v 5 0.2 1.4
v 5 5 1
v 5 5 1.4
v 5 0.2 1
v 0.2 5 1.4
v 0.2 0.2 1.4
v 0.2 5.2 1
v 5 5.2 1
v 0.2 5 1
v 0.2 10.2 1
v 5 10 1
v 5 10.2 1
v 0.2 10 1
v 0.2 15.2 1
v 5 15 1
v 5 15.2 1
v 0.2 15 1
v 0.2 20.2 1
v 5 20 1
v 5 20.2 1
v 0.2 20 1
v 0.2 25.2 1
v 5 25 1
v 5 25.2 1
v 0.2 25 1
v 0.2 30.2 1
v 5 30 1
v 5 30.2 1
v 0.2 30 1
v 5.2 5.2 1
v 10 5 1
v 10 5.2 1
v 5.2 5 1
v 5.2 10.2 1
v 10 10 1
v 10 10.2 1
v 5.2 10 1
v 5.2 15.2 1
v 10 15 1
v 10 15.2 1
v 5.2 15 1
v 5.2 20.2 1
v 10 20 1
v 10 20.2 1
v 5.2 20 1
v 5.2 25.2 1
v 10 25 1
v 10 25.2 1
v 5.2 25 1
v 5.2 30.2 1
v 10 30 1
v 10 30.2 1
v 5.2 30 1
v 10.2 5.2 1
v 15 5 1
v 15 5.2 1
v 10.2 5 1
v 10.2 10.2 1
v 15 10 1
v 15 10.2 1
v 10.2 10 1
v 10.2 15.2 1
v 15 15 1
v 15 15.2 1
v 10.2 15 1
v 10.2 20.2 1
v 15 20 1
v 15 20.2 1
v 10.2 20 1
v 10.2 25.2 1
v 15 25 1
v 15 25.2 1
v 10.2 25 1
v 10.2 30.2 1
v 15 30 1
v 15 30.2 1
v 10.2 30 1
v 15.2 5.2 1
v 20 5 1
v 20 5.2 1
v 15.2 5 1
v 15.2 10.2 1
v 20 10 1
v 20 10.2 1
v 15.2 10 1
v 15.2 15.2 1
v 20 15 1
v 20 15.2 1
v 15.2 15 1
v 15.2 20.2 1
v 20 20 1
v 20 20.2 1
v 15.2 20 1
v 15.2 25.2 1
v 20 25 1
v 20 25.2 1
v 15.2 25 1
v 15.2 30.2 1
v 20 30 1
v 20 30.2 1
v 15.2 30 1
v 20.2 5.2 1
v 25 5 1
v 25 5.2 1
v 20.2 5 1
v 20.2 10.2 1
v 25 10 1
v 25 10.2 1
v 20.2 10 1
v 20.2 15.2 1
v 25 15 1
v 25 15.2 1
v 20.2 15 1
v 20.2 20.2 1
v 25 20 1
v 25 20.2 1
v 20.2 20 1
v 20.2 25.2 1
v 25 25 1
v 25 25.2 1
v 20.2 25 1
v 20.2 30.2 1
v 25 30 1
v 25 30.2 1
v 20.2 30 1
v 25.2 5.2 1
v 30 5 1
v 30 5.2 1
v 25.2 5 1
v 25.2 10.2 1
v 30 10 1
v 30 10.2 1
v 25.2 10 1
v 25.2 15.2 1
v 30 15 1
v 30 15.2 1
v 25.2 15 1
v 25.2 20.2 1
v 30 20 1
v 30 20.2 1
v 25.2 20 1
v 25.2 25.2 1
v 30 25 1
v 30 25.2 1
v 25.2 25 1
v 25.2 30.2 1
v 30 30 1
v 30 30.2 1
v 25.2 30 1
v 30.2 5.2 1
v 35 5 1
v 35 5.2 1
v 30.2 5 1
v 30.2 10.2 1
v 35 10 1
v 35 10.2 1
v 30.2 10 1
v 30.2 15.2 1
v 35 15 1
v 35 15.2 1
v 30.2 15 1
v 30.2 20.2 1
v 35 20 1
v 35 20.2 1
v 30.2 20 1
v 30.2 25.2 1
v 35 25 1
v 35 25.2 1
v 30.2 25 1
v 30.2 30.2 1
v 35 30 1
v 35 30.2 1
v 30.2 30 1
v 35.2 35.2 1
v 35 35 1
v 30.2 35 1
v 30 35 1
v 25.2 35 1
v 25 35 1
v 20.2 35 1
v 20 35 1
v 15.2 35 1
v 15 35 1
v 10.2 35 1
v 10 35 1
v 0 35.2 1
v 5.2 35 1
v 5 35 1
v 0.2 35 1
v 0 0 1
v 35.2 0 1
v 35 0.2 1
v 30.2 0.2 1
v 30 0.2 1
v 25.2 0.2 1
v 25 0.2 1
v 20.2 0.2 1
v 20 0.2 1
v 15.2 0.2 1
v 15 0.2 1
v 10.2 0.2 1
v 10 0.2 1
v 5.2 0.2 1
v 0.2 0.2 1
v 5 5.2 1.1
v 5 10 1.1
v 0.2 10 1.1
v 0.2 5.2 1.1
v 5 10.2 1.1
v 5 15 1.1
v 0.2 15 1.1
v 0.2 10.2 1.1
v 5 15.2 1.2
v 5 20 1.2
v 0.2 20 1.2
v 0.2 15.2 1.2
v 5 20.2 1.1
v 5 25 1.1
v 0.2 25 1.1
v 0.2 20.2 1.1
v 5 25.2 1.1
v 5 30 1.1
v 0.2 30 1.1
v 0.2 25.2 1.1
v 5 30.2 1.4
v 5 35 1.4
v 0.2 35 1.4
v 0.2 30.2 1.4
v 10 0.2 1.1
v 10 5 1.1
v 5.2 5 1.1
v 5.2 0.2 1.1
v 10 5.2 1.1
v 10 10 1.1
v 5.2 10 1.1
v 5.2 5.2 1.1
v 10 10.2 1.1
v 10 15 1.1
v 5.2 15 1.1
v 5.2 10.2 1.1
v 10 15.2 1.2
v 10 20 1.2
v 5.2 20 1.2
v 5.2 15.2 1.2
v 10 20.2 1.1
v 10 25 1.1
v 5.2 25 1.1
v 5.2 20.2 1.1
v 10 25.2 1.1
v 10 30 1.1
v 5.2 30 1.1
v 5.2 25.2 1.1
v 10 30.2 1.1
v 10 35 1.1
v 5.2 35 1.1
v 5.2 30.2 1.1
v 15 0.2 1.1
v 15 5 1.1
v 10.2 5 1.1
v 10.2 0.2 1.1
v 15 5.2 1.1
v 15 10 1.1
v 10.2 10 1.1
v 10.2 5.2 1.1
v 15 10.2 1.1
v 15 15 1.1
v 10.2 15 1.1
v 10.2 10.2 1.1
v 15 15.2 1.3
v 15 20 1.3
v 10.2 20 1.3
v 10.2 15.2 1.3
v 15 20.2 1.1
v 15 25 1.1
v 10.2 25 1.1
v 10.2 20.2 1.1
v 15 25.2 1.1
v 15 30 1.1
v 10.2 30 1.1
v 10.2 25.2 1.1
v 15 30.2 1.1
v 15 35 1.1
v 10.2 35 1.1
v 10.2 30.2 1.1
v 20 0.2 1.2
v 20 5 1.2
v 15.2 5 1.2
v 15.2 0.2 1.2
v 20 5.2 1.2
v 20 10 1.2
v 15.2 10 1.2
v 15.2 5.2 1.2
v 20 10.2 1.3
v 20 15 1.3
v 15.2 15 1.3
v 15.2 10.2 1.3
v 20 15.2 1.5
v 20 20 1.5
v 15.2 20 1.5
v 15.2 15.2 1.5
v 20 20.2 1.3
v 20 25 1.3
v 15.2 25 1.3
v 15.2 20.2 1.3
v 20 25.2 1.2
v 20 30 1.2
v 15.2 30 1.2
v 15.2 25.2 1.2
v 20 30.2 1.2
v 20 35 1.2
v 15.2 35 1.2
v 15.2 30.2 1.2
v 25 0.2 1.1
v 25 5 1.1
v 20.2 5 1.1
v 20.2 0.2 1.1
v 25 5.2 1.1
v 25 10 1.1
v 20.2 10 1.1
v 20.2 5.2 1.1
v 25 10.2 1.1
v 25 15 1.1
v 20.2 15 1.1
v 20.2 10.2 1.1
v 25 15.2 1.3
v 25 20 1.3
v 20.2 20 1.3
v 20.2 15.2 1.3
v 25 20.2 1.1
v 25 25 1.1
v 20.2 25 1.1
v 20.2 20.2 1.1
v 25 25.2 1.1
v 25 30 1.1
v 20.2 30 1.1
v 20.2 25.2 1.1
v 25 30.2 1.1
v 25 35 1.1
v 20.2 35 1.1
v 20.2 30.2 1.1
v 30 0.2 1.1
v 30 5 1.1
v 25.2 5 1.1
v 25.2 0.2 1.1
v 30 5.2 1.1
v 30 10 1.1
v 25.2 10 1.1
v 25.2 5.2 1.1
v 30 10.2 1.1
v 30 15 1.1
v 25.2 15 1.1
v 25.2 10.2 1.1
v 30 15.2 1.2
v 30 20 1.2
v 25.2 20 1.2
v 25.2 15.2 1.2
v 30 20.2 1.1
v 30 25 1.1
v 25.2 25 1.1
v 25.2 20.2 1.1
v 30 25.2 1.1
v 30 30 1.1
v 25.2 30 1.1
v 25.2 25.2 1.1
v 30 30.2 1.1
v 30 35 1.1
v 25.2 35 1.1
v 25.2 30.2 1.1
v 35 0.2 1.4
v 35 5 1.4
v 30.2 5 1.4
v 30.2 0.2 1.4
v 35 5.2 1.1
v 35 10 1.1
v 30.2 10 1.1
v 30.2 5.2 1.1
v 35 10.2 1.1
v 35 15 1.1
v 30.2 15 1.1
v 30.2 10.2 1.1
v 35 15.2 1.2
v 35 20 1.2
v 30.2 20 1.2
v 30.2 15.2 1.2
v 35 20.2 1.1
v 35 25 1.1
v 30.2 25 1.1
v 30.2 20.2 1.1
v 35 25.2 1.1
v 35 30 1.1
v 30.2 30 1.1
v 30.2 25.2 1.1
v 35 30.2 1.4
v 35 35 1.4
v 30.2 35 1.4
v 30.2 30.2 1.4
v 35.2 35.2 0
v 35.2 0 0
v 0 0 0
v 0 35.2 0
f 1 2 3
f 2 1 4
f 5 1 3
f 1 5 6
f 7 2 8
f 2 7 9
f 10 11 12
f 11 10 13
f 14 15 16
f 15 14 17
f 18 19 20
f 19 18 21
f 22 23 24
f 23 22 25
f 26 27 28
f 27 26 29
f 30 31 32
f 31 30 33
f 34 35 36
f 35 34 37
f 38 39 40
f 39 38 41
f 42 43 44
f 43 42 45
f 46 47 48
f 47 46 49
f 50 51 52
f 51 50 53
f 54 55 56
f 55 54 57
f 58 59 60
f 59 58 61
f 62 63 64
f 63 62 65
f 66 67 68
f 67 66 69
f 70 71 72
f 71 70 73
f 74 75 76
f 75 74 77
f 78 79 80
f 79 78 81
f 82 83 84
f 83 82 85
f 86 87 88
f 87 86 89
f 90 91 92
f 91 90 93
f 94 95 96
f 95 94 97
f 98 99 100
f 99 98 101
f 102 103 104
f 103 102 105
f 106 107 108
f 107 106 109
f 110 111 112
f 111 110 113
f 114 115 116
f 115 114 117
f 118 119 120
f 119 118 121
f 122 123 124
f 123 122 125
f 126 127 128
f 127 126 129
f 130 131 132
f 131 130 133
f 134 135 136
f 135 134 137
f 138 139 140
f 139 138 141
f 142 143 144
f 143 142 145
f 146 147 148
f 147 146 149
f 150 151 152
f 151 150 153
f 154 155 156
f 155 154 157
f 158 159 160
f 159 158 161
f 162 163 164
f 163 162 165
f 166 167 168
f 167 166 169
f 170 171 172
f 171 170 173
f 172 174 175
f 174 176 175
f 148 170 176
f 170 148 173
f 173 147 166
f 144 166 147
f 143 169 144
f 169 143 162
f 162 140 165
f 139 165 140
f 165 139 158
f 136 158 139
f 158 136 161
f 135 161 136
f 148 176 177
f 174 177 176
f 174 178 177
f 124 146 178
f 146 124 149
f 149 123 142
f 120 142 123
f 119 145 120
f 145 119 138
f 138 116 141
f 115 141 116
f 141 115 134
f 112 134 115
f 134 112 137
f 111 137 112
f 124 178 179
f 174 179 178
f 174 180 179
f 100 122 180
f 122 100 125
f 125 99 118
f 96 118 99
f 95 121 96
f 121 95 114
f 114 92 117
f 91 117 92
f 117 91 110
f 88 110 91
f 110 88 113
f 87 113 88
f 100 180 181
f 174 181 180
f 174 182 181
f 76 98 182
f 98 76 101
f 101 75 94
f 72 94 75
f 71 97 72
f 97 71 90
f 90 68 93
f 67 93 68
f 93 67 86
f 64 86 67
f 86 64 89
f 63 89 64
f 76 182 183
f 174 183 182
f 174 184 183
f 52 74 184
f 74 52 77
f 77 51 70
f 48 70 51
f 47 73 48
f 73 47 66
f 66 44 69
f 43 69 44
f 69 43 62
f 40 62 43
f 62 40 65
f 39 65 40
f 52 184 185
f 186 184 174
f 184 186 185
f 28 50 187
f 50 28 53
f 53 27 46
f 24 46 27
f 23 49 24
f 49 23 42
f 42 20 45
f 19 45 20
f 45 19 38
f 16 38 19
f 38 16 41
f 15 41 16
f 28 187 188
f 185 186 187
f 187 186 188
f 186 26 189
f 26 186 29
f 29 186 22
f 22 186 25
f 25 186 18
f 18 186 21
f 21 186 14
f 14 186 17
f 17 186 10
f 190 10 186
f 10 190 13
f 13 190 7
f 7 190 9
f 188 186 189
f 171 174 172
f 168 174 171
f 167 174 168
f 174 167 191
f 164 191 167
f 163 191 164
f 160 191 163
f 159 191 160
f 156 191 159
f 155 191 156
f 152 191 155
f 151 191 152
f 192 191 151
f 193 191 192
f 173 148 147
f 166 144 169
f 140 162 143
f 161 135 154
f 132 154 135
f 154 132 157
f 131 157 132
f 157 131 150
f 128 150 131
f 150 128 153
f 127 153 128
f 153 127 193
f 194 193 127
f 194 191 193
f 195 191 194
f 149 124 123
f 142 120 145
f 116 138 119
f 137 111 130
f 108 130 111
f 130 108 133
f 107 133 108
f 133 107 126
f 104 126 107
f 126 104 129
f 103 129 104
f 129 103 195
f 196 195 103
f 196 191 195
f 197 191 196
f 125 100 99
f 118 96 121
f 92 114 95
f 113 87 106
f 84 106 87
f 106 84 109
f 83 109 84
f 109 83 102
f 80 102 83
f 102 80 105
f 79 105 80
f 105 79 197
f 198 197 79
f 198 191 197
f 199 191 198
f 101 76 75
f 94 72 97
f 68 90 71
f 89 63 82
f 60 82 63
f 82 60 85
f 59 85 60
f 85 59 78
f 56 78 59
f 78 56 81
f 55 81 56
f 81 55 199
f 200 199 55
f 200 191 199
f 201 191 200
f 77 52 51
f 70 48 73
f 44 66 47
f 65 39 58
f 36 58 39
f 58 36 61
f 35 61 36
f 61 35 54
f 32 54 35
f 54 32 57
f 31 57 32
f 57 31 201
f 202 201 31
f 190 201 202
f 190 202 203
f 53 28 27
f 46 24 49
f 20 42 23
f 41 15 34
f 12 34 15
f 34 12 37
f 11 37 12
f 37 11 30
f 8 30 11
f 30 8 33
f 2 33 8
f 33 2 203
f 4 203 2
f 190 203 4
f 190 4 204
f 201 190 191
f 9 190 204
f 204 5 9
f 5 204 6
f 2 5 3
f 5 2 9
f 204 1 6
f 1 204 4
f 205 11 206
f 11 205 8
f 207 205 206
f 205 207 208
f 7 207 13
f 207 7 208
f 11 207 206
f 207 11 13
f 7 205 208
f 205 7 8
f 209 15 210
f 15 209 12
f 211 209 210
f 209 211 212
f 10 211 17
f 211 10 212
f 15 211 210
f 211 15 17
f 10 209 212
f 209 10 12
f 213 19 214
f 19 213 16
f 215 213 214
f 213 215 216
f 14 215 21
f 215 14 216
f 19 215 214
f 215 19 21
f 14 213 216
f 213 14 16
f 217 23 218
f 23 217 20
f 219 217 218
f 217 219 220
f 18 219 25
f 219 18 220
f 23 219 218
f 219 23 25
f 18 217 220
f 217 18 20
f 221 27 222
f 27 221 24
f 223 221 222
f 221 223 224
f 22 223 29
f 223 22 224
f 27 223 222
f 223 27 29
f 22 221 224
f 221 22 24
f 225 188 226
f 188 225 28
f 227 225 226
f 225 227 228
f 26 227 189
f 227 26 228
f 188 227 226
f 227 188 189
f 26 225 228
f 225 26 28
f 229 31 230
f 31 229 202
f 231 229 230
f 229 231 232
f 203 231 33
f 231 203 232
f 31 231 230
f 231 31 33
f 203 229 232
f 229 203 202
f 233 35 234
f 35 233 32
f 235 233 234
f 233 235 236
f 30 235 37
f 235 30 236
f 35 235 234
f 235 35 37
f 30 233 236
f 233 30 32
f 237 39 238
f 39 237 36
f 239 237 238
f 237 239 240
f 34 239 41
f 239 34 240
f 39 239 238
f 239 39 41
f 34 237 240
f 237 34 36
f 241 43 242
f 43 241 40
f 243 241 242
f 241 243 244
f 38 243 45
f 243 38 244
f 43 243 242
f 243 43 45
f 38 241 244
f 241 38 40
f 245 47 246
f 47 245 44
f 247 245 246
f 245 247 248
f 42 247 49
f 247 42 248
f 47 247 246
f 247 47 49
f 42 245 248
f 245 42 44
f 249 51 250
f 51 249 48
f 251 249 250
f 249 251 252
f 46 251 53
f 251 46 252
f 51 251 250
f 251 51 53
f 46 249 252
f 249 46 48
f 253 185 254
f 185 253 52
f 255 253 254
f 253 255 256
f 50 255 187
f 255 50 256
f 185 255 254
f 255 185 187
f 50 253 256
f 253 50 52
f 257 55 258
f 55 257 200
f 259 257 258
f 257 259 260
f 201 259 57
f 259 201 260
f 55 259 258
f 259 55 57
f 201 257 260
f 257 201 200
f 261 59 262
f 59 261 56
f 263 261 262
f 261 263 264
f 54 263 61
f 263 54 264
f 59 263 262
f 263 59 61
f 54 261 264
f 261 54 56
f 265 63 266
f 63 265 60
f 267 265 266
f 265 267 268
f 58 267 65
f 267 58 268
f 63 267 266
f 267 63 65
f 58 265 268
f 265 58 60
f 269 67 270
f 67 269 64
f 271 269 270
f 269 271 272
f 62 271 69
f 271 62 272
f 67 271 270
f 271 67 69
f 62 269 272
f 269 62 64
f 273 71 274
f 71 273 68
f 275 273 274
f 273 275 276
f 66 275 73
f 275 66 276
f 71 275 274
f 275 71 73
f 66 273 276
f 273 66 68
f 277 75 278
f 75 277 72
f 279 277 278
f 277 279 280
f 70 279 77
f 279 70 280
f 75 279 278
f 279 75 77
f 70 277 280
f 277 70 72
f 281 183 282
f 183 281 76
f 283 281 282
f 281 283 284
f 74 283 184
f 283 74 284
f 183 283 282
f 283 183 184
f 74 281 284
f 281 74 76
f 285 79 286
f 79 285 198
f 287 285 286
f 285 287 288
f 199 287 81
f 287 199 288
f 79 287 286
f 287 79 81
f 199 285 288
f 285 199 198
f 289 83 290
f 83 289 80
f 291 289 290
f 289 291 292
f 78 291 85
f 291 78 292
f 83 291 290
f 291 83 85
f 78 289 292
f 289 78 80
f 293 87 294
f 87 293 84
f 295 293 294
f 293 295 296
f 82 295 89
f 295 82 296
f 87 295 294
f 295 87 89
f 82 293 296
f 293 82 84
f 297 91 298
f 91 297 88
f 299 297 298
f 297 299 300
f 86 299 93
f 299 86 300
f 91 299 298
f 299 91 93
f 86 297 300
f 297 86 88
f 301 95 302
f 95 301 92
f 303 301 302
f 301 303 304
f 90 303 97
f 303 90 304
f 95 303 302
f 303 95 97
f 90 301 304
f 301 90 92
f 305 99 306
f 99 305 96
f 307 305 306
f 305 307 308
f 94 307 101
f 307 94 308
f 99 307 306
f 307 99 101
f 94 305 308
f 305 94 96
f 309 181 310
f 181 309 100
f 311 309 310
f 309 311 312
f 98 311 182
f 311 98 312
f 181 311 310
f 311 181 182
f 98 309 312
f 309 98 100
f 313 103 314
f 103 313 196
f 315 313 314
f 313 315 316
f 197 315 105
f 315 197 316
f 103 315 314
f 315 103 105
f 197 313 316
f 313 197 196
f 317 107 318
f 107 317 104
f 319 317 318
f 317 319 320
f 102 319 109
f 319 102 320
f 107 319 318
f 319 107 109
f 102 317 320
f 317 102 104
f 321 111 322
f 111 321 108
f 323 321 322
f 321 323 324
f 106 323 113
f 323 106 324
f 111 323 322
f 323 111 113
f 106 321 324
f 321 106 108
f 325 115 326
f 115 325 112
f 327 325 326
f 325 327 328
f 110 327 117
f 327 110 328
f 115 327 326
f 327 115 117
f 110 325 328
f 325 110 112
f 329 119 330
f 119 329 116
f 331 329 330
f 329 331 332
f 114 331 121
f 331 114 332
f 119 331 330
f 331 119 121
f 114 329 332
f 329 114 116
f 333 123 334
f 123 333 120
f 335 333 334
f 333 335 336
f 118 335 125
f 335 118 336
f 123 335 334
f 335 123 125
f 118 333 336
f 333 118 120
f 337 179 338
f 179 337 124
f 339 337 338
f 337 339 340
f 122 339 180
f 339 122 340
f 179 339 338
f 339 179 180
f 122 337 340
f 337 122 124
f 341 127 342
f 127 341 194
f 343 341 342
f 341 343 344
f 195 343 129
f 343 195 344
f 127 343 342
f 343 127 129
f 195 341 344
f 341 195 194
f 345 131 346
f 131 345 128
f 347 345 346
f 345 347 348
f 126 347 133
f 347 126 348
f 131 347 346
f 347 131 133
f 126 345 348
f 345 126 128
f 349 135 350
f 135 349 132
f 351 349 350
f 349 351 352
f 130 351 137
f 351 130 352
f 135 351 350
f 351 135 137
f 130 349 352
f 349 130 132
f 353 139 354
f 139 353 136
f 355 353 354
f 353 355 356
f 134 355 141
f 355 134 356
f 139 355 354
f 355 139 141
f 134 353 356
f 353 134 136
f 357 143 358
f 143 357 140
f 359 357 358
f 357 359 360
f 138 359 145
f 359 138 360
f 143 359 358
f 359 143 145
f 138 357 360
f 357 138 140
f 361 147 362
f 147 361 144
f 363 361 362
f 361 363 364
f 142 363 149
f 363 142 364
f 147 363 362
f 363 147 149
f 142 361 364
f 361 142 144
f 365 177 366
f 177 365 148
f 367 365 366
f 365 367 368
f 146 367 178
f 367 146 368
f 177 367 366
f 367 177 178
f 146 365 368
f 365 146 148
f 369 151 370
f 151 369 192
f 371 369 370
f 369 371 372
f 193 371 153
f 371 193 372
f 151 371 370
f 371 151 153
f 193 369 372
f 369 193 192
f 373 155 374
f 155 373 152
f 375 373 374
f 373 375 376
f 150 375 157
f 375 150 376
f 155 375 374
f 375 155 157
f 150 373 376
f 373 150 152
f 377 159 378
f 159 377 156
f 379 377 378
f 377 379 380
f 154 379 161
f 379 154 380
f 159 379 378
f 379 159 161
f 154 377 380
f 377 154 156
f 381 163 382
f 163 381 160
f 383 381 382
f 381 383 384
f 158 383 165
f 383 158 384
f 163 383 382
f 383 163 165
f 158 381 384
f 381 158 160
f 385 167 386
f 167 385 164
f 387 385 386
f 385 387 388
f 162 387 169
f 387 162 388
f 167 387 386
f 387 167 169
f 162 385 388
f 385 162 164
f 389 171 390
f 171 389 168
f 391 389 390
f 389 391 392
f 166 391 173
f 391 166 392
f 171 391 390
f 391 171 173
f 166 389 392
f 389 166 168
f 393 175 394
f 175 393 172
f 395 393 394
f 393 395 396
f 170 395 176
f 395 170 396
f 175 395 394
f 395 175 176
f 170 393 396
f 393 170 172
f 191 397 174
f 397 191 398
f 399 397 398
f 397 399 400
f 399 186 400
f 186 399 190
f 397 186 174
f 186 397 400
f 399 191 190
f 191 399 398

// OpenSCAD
// ------------------------------------------------- ;
//
//         Single File Tafl Game Generator
//
// ------------------------------------------------- ;

// ------------------------------------------------- ;
//         User Configuration Section
// ------------------------------------------------- ;

// Specific set configuration to print. 1 - Brandubh, 2 - Ard Ri, 3 - Tablut, 4 - Tawlbwrdd, 5 - Hnefatafl, 6 - Alea Evangelii.
SetID = 1;

// What to generate. 1 - Board, 2 - Pieces, 3 - Single Pawn, 4 - Single King.
Generate = 1;

// Specific piece style to print. 1 - Horik, 2 - Forkbeard
PieceID = 1;

// Level of detail for smoothing. Low - 90, Medium - 180, High - 360.
Detail = 180;

// Scale output. Pieces have a 4mm base with varying overhangs and the boards are 4.8mm squares with 0.2mm spacing and margins.
Scale = 1;

// ------------------------------------------------- ;
//         End User Configuration
// ------------------------------------------------- ;

scale(Scale)

if (Generate == 1) {
   
   GenerateBoard(SetID);
   
} else if (Generate == 2) {
   
   GeneratePieces(SetID, PieceID, Detail);
   
} else if (Generate == 3) {
   
   TaflPawn(PieceID, Detail);
   
} else if (Generate == 4) {
   
   TaflKing(PieceID, Detail);
   
}

// Board definition
// 0 - Normal Square
// 1 - Black Square
// 2 - White Square
// 3 - Corner
// 4 - Throne

// Generate tafl board by SetID
module GenerateBoard(SetID) {

   if (SetID == 1) {
      
      // Brandubh
      BoardSize = 7;
      
      Board = [[3, 0, 0, 1, 0, 0, 3],
               [0, 0, 0, 1, 0, 0, 0],
               [0, 0, 0, 2, 0, 0, 0],
               [1, 1, 2, 4, 2, 1, 1],
               [0, 0, 0, 2, 0, 0, 0],
               [0, 0, 0, 1, 0, 0, 0],
               [3, 0, 0, 1, 0, 0, 3]];
      
      TaflBoard(BoardSize, Board);
      
   } else if ((SetID == 2)) {
      
      // Ard Ri
      BoardSize = 7;
      
      Board = [[3, 0, 1, 1, 1, 0, 3],
               [0, 0, 0, 1, 0, 0, 0],
               [1, 0, 2, 2, 2, 0, 1],
               [1, 1, 2, 4, 2, 1, 1],
               [1, 0, 2, 2, 2, 0, 1],
               [0, 0, 0, 1, 0, 0, 0],
               [3, 0, 1, 1, 1, 0, 3]];
      
      TaflBoard(BoardSize, Board);
      
   } else if ((SetID == 3)) {
      
      // Tablut
      BoardSize = 9;
      
      Board = [[3, 0, 0, 1, 1, 1, 0, 0, 3],
               [0, 0, 0, 0, 1, 0, 0, 0, 0],
               [0, 0, 0, 0, 2, 0, 0, 0, 0],
               [1, 0, 0, 0, 2, 0, 0, 0, 1],
               [1, 1, 2, 2, 4, 2, 2, 1, 1],
               [1, 0, 0, 0, 2, 0, 0, 0, 1],
               [0, 0, 0, 0, 2, 0, 0, 0, 0],
               [0, 0, 0, 0, 1, 0, 0, 0, 0],
               [3, 0, 0, 1, 1, 1, 0, 0, 3],];
      
      
      TaflBoard(BoardSize, Board);
      
   } else if (SetID == 4) { 
      
      //Tawlbwrdd
      BoardSize = 11;
      
      Board = [[3, 0, 0, 0, 1, 1, 1, 0, 0, 0, 3],
               [0, 0, 0, 0, 1, 0, 1, 0, 0, 0, 0],
               [0, 0, 0, 0, 0, 1, 0, 0, 0, 0, 0],
               [0, 0, 0, 0, 0, 2, 0, 0, 0, 0, 0],
               [1, 1, 0, 0, 2, 2, 2, 0, 0, 1, 1],
               [1, 0, 1, 2, 2, 4, 2, 2, 1, 0, 1],
               [1, 1, 0, 0, 2, 2, 2, 0, 0, 1, 1],
               [0, 0, 0, 0, 0, 2, 0, 0, 0, 0, 0],
               [0, 0, 0, 0, 0, 1, 0, 0, 0, 0, 0],
               [0, 0, 0, 0, 1, 0, 1, 0, 0, 0, 0],
               [3, 0, 0, 0, 1, 1, 1, 0, 0, 0, 3]];
      
      
      TaflBoard(BoardSize, Board);
      
   } else if ((SetID == 5)) {
      
      // Hnefatafl
      BoardSize = 11;
      
      Board = [[3, 0, 0, 1, 1, 1, 1, 1, 0, 0, 3],
               [0, 0, 0, 0, 0, 1, 0, 0, 0, 0, 0],
               [0, 0, 0, 0, 0, 0, 0, 0, 0, 0, 0],
               [1, 0, 0, 0, 0, 2, 0, 0, 0, 0, 1],
               [1, 0, 0, 0, 2, 2, 2, 0, 0, 0, 1],
               [1, 1, 0, 2, 2, 4, 2, 2, 0, 1, 1],
               [1, 0, 0, 0, 2, 2, 2, 0, 0, 0, 1],
               [1, 0, 0, 0, 0, 2, 0, 0, 0, 0, 1],
               [0, 0, 0, 0, 0, 0, 0, 0, 0, 0, 0],
               [0, 0, 0, 0, 0, 1, 0, 0, 0, 0, 0],
               [3, 0, 0, 1, 1, 1, 1, 1, 0, 0, 3]];
      
      
      TaflBoard(BoardSize, Board);
      
   } else if (SetID == 6) {
      
      // Alea Evangelii
      BoardSize =19;
      
      Board = [[3, 3, 1, 0, 0, 1, 0, 0, 0, 0, 0, 0, 0, 1, 0, 0, 1, 3, 3],
               [3, 3, 0, 0, 0, 0, 0, 0, 0, 0, 0, 0, 0, 0, 0, 0, 0, 3, 3],
               [1, 0, 0, 0, 0, 1, 0, 0, 0, 0, 0, 0, 0, 1, 0, 0, 0, 0, 1],
               [0, 0, 0, 0, 0, 0, 0, 1, 0, 1, 0, 1, 0, 0, 0, 0, 0, 0, 0],
               [0, 0, 0, 0, 0, 0, 1, 0, 2, 0, 2, 0, 1, 0, 0, 0, 0, 0, 0],
               [1, 0, 1, 0, 0, 1, 0, 0, 0, 0, 0, 0, 0, 1, 0, 0, 1, 0, 1],
               [0, 0, 0, 0, 1, 0, 0, 0, 0, 2, 0, 0, 0, 0, 1, 0, 0, 0, 0],
               [0, 0, 0, 1, 0, 0, 0, 0, 2, 0, 2, 0, 0, 0, 0, 1, 0, 0, 0],
               [0, 0, 0, 0, 2, 0, 0, 2, 0, 2, 0, 2, 0, 0, 2, 0, 0, 0, 0],
               [0, 0, 0, 1, 0, 0, 2, 0, 2, 4, 2, 0, 2, 0, 0, 1, 0, 0, 0],
               [0, 0, 0, 0, 2, 0, 0, 2, 0, 2, 0, 2, 0, 0, 2, 0, 0, 0, 0],
               [0, 0, 0, 1, 0, 0, 0, 0, 2, 0, 2, 0, 0, 0, 0, 1, 0, 0, 0],
               [0, 0, 0, 0, 1, 0, 0, 0, 0, 2, 0, 0, 0, 0, 1, 0, 0, 0, 0],
               [1, 0, 1, 0, 0, 1, 0, 0, 0, 0, 0, 0, 0, 1, 0, 0, 1, 0, 1],
               [0, 0, 0, 0, 0, 0, 1, 0, 2, 0, 2, 0, 1, 0, 0, 0, 0, 0, 0],
               [0, 0, 0, 0, 0, 0, 0, 1, 0, 1, 0, 1, 0, 0, 0, 0, 0, 0, 0],
               [1, 0, 0, 0, 0, 1, 0, 0, 0, 0, 0, 0, 0, 1, 0, 0, 0, 0, 1],
               [3, 3, 0, 0, 0, 0, 0, 0, 0, 0, 0, 0, 0, 0, 0, 0, 0, 3, 3],
               [3, 3, 1, 0, 0, 1, 0, 0, 0, 0, 0, 0, 0, 1, 0, 0, 1, 3, 3]];
      
      
      TaflBoard(BoardSize, Board);
      
   }
   
};

// Create tafl board.
module TaflBoard(BoardSize, Board) {
   
   union() {
      
      cube([(BoardSize * 5) + 0.2, (BoardSize * 5) + 0.2, 1]);
      
      for (x = [0:BoardSize - 1]) {
         
         for (y = [0:BoardSize - 1]) {
            
            translate([(x * 5) + 0.2, (y * 5) + 0.2, 1]) {
              
              cube([4.8 ,4.8 ,(Board[x][y] + 1) * 0.1]);
              
            }
            
         }
         
      }
   
   }
   
};

// Generate set of pieces by SetID.
module GeneratePieces(SetID, PieceID, Detail) {
   
   if (SetID == 1) {
      
      // Brandubh
      TaflPieces(
      KingCount = 1,
      WhiteCount = 4,
      BlackCount = 8,
      GridPadding = 0,
      PieceID = PieceID,
      Detail = Detail);
      
   } else if ((SetID == 2) || (SetID == 3)) {
      
      // Ard Ri/Tablut
      TaflPieces(
      KingCount = 1,
      WhiteCount = 8,
      BlackCount = 12,
      GridPadding = 0,
      PieceID = PieceID,
      Detail = Detail);
      
   } else if ((SetID == 4) || (SetID == 5)) {
      
      // Hnefatafl/Tawlbwrdd
      TaflPieces(
      KingCount = 1,
      WhiteCount = 12,
      BlackCount = 24,
      GridPadding = 1,
      PieceID = PieceID,
      Detail = Detail);
      
   } else if (SetID == 6) {
      
      // Alea Evangelii
      TaflPieces(
      KingCount = 1,
      WhiteCount = 24,
      BlackCount = 48,
      GridPadding = 0,
      PieceID = PieceID,
      Detail = Detail);
      
   }
   
};

// Generate selected piece layout for printing.
module TaflPieces(KingCount, WhiteCount, BlackCount, GridPadding, PieceID, Detail) {
   
   TotalCount = BlackCount + WhiteCount + KingCount;
   
   GridLayout = round(sqrt(TotalCount)) + GridPadding;
   
   for (x = [1:GridLayout]){
      
      for (y = [1:GridLayout]){
         
         CurrentPiece = (((x-1) * GridLayout) + y);
         
         if (CurrentPiece < KingCount + 1) {
            
            color("white")
            translate([(x * 5) - 2.5, (y * 5) - 2.5])
            TaflKing(PieceID, Detail);
            
         } else if ((CurrentPiece > KingCount)&&(CurrentPiece < WhiteCount + KingCount + 1)) {
            
            color("white")
            translate([(x * 5) - 2.5, (y * 5) - 2.5])
            TaflPawn(PieceID, Detail);
            
         } else if ((CurrentPiece < TotalCount + 1)&&(CurrentPiece > WhiteCount + KingCount)) {
            
            color("black")
            translate([(x * 5) - 2.5, (y * 5) - 2.5])
            TaflPawn(PieceID, Detail);
            
         }
         
      }
      
   }
   
};

// Generate pawn of pieces by PieceID.
module TaflPawn(PieceID, Detail) {
   
   if (PieceID == 1) {
      
      HorikTaflPawn(Detail);
      
   } else if (PieceID == 2) {
      
      ForkbeardTaflPawn(Detail);
      
   }
   
};

// Generate Horik style pawn piece.
module HorikTaflPawn(Detail) {
   
   // Join pieces into single manifold mesh.
   union() {
      
      // Rotate extrude base and stem from polygon.
      rotate_extrude($fn=Detail) {
         polygon( points=[ [0, 0], [2, 0], [2.1, 0.2], [1.75, 0.3], [1.5, 0.5], [1.25, 0.8], [1.5, 1], [1.5, 1.1], [1.4, 1.15], [1.2, 1.3], [1, 1.4], [1, 2], [1, 3.4], [1.1, 3.5], [1.1, 3.6], [1, 3.7], [0.5, 5], [0, 5] ] );
      }
      
      // Create head piece and translate.
      translate([0, 0, 5]) {
         sphere(1.25, center=true, $fn=Detail);
      }
      
   };
   
};

// Generate Forkbeard style pawn piece.
module ForkbeardTaflPawn(Detail) {
   
   // Indent base with low poly sphere.
   difference() {
      
      // Rotate extrude base from polygon.
      rotate_extrude($fn=Detail) {
         polygon( points=[ [0, 0], [2, 0], [2.1, 0.2], [2.1, 1], [1.8, 1], [1.8, 0.8], [0, 0.8] ] );
      }
      
      // Indent piece with sphere.
      translate([0, 0, 1.5]) {
         sphere(1, center=true, $fn=6);
      }
      
   };
   
};

// Generate king by PieceID.
module TaflKing(PieceID, Detail) {
   
   if (PieceID == 1) {
      
      HorikTaflKing(Detail);
      
   } else if (PieceID == 2) {
      
      ForkbeardTaflKing(Detail);
      
   }  
   
};

// Generate Horik style king piece.
module HorikTaflKing(Detail = 180) {

   // Join pieces into single manifold mesh.
   union() {
      
      // Rotate extrude base and stem from polygon.
      rotate_extrude($fn=Detail) {
         polygon( points=[ [0, 0], [2, 0], [2.1, 0.2], [1.75, 0.3], [1.5, 0.5], [1.25, 0.8], [1.5, 1], [1.5, 1.1], [1.4, 1.15], [1.2, 1.3], [1, 1.4], [1, 2], [1, 5.4], [1.1, 5.5], [1.1, 5.6], [1, 5.7], [0.5, 7], [0, 7] ] );
      }
      
      // Create head piece and translate.
      translate([0, 0, 7]) {
         sphere(1.25, center=true, $fn=Detail);
      }
      
   };
   
};

// Generate Forkbeard style king piece.
module ForkbeardTaflKing(Detail) {
   
   // Indent base with low poly sphere.
   difference() {
      
      // Rotate extrude base from polygon.
      rotate_extrude($fn=Detail) {
         polygon( points=[ [0, 0], [2, 0], [2.1, 0.2], [2.1, 1.5], [1.8, 1.5], [1.8, 1.3], [0, 1.3] ] );
      }
      
      // Indent piece with sphere.
      translate([0, 0, 1.5]) {
         sphere(1, center=true, $fn=8);
      }
      
   };
   
};
